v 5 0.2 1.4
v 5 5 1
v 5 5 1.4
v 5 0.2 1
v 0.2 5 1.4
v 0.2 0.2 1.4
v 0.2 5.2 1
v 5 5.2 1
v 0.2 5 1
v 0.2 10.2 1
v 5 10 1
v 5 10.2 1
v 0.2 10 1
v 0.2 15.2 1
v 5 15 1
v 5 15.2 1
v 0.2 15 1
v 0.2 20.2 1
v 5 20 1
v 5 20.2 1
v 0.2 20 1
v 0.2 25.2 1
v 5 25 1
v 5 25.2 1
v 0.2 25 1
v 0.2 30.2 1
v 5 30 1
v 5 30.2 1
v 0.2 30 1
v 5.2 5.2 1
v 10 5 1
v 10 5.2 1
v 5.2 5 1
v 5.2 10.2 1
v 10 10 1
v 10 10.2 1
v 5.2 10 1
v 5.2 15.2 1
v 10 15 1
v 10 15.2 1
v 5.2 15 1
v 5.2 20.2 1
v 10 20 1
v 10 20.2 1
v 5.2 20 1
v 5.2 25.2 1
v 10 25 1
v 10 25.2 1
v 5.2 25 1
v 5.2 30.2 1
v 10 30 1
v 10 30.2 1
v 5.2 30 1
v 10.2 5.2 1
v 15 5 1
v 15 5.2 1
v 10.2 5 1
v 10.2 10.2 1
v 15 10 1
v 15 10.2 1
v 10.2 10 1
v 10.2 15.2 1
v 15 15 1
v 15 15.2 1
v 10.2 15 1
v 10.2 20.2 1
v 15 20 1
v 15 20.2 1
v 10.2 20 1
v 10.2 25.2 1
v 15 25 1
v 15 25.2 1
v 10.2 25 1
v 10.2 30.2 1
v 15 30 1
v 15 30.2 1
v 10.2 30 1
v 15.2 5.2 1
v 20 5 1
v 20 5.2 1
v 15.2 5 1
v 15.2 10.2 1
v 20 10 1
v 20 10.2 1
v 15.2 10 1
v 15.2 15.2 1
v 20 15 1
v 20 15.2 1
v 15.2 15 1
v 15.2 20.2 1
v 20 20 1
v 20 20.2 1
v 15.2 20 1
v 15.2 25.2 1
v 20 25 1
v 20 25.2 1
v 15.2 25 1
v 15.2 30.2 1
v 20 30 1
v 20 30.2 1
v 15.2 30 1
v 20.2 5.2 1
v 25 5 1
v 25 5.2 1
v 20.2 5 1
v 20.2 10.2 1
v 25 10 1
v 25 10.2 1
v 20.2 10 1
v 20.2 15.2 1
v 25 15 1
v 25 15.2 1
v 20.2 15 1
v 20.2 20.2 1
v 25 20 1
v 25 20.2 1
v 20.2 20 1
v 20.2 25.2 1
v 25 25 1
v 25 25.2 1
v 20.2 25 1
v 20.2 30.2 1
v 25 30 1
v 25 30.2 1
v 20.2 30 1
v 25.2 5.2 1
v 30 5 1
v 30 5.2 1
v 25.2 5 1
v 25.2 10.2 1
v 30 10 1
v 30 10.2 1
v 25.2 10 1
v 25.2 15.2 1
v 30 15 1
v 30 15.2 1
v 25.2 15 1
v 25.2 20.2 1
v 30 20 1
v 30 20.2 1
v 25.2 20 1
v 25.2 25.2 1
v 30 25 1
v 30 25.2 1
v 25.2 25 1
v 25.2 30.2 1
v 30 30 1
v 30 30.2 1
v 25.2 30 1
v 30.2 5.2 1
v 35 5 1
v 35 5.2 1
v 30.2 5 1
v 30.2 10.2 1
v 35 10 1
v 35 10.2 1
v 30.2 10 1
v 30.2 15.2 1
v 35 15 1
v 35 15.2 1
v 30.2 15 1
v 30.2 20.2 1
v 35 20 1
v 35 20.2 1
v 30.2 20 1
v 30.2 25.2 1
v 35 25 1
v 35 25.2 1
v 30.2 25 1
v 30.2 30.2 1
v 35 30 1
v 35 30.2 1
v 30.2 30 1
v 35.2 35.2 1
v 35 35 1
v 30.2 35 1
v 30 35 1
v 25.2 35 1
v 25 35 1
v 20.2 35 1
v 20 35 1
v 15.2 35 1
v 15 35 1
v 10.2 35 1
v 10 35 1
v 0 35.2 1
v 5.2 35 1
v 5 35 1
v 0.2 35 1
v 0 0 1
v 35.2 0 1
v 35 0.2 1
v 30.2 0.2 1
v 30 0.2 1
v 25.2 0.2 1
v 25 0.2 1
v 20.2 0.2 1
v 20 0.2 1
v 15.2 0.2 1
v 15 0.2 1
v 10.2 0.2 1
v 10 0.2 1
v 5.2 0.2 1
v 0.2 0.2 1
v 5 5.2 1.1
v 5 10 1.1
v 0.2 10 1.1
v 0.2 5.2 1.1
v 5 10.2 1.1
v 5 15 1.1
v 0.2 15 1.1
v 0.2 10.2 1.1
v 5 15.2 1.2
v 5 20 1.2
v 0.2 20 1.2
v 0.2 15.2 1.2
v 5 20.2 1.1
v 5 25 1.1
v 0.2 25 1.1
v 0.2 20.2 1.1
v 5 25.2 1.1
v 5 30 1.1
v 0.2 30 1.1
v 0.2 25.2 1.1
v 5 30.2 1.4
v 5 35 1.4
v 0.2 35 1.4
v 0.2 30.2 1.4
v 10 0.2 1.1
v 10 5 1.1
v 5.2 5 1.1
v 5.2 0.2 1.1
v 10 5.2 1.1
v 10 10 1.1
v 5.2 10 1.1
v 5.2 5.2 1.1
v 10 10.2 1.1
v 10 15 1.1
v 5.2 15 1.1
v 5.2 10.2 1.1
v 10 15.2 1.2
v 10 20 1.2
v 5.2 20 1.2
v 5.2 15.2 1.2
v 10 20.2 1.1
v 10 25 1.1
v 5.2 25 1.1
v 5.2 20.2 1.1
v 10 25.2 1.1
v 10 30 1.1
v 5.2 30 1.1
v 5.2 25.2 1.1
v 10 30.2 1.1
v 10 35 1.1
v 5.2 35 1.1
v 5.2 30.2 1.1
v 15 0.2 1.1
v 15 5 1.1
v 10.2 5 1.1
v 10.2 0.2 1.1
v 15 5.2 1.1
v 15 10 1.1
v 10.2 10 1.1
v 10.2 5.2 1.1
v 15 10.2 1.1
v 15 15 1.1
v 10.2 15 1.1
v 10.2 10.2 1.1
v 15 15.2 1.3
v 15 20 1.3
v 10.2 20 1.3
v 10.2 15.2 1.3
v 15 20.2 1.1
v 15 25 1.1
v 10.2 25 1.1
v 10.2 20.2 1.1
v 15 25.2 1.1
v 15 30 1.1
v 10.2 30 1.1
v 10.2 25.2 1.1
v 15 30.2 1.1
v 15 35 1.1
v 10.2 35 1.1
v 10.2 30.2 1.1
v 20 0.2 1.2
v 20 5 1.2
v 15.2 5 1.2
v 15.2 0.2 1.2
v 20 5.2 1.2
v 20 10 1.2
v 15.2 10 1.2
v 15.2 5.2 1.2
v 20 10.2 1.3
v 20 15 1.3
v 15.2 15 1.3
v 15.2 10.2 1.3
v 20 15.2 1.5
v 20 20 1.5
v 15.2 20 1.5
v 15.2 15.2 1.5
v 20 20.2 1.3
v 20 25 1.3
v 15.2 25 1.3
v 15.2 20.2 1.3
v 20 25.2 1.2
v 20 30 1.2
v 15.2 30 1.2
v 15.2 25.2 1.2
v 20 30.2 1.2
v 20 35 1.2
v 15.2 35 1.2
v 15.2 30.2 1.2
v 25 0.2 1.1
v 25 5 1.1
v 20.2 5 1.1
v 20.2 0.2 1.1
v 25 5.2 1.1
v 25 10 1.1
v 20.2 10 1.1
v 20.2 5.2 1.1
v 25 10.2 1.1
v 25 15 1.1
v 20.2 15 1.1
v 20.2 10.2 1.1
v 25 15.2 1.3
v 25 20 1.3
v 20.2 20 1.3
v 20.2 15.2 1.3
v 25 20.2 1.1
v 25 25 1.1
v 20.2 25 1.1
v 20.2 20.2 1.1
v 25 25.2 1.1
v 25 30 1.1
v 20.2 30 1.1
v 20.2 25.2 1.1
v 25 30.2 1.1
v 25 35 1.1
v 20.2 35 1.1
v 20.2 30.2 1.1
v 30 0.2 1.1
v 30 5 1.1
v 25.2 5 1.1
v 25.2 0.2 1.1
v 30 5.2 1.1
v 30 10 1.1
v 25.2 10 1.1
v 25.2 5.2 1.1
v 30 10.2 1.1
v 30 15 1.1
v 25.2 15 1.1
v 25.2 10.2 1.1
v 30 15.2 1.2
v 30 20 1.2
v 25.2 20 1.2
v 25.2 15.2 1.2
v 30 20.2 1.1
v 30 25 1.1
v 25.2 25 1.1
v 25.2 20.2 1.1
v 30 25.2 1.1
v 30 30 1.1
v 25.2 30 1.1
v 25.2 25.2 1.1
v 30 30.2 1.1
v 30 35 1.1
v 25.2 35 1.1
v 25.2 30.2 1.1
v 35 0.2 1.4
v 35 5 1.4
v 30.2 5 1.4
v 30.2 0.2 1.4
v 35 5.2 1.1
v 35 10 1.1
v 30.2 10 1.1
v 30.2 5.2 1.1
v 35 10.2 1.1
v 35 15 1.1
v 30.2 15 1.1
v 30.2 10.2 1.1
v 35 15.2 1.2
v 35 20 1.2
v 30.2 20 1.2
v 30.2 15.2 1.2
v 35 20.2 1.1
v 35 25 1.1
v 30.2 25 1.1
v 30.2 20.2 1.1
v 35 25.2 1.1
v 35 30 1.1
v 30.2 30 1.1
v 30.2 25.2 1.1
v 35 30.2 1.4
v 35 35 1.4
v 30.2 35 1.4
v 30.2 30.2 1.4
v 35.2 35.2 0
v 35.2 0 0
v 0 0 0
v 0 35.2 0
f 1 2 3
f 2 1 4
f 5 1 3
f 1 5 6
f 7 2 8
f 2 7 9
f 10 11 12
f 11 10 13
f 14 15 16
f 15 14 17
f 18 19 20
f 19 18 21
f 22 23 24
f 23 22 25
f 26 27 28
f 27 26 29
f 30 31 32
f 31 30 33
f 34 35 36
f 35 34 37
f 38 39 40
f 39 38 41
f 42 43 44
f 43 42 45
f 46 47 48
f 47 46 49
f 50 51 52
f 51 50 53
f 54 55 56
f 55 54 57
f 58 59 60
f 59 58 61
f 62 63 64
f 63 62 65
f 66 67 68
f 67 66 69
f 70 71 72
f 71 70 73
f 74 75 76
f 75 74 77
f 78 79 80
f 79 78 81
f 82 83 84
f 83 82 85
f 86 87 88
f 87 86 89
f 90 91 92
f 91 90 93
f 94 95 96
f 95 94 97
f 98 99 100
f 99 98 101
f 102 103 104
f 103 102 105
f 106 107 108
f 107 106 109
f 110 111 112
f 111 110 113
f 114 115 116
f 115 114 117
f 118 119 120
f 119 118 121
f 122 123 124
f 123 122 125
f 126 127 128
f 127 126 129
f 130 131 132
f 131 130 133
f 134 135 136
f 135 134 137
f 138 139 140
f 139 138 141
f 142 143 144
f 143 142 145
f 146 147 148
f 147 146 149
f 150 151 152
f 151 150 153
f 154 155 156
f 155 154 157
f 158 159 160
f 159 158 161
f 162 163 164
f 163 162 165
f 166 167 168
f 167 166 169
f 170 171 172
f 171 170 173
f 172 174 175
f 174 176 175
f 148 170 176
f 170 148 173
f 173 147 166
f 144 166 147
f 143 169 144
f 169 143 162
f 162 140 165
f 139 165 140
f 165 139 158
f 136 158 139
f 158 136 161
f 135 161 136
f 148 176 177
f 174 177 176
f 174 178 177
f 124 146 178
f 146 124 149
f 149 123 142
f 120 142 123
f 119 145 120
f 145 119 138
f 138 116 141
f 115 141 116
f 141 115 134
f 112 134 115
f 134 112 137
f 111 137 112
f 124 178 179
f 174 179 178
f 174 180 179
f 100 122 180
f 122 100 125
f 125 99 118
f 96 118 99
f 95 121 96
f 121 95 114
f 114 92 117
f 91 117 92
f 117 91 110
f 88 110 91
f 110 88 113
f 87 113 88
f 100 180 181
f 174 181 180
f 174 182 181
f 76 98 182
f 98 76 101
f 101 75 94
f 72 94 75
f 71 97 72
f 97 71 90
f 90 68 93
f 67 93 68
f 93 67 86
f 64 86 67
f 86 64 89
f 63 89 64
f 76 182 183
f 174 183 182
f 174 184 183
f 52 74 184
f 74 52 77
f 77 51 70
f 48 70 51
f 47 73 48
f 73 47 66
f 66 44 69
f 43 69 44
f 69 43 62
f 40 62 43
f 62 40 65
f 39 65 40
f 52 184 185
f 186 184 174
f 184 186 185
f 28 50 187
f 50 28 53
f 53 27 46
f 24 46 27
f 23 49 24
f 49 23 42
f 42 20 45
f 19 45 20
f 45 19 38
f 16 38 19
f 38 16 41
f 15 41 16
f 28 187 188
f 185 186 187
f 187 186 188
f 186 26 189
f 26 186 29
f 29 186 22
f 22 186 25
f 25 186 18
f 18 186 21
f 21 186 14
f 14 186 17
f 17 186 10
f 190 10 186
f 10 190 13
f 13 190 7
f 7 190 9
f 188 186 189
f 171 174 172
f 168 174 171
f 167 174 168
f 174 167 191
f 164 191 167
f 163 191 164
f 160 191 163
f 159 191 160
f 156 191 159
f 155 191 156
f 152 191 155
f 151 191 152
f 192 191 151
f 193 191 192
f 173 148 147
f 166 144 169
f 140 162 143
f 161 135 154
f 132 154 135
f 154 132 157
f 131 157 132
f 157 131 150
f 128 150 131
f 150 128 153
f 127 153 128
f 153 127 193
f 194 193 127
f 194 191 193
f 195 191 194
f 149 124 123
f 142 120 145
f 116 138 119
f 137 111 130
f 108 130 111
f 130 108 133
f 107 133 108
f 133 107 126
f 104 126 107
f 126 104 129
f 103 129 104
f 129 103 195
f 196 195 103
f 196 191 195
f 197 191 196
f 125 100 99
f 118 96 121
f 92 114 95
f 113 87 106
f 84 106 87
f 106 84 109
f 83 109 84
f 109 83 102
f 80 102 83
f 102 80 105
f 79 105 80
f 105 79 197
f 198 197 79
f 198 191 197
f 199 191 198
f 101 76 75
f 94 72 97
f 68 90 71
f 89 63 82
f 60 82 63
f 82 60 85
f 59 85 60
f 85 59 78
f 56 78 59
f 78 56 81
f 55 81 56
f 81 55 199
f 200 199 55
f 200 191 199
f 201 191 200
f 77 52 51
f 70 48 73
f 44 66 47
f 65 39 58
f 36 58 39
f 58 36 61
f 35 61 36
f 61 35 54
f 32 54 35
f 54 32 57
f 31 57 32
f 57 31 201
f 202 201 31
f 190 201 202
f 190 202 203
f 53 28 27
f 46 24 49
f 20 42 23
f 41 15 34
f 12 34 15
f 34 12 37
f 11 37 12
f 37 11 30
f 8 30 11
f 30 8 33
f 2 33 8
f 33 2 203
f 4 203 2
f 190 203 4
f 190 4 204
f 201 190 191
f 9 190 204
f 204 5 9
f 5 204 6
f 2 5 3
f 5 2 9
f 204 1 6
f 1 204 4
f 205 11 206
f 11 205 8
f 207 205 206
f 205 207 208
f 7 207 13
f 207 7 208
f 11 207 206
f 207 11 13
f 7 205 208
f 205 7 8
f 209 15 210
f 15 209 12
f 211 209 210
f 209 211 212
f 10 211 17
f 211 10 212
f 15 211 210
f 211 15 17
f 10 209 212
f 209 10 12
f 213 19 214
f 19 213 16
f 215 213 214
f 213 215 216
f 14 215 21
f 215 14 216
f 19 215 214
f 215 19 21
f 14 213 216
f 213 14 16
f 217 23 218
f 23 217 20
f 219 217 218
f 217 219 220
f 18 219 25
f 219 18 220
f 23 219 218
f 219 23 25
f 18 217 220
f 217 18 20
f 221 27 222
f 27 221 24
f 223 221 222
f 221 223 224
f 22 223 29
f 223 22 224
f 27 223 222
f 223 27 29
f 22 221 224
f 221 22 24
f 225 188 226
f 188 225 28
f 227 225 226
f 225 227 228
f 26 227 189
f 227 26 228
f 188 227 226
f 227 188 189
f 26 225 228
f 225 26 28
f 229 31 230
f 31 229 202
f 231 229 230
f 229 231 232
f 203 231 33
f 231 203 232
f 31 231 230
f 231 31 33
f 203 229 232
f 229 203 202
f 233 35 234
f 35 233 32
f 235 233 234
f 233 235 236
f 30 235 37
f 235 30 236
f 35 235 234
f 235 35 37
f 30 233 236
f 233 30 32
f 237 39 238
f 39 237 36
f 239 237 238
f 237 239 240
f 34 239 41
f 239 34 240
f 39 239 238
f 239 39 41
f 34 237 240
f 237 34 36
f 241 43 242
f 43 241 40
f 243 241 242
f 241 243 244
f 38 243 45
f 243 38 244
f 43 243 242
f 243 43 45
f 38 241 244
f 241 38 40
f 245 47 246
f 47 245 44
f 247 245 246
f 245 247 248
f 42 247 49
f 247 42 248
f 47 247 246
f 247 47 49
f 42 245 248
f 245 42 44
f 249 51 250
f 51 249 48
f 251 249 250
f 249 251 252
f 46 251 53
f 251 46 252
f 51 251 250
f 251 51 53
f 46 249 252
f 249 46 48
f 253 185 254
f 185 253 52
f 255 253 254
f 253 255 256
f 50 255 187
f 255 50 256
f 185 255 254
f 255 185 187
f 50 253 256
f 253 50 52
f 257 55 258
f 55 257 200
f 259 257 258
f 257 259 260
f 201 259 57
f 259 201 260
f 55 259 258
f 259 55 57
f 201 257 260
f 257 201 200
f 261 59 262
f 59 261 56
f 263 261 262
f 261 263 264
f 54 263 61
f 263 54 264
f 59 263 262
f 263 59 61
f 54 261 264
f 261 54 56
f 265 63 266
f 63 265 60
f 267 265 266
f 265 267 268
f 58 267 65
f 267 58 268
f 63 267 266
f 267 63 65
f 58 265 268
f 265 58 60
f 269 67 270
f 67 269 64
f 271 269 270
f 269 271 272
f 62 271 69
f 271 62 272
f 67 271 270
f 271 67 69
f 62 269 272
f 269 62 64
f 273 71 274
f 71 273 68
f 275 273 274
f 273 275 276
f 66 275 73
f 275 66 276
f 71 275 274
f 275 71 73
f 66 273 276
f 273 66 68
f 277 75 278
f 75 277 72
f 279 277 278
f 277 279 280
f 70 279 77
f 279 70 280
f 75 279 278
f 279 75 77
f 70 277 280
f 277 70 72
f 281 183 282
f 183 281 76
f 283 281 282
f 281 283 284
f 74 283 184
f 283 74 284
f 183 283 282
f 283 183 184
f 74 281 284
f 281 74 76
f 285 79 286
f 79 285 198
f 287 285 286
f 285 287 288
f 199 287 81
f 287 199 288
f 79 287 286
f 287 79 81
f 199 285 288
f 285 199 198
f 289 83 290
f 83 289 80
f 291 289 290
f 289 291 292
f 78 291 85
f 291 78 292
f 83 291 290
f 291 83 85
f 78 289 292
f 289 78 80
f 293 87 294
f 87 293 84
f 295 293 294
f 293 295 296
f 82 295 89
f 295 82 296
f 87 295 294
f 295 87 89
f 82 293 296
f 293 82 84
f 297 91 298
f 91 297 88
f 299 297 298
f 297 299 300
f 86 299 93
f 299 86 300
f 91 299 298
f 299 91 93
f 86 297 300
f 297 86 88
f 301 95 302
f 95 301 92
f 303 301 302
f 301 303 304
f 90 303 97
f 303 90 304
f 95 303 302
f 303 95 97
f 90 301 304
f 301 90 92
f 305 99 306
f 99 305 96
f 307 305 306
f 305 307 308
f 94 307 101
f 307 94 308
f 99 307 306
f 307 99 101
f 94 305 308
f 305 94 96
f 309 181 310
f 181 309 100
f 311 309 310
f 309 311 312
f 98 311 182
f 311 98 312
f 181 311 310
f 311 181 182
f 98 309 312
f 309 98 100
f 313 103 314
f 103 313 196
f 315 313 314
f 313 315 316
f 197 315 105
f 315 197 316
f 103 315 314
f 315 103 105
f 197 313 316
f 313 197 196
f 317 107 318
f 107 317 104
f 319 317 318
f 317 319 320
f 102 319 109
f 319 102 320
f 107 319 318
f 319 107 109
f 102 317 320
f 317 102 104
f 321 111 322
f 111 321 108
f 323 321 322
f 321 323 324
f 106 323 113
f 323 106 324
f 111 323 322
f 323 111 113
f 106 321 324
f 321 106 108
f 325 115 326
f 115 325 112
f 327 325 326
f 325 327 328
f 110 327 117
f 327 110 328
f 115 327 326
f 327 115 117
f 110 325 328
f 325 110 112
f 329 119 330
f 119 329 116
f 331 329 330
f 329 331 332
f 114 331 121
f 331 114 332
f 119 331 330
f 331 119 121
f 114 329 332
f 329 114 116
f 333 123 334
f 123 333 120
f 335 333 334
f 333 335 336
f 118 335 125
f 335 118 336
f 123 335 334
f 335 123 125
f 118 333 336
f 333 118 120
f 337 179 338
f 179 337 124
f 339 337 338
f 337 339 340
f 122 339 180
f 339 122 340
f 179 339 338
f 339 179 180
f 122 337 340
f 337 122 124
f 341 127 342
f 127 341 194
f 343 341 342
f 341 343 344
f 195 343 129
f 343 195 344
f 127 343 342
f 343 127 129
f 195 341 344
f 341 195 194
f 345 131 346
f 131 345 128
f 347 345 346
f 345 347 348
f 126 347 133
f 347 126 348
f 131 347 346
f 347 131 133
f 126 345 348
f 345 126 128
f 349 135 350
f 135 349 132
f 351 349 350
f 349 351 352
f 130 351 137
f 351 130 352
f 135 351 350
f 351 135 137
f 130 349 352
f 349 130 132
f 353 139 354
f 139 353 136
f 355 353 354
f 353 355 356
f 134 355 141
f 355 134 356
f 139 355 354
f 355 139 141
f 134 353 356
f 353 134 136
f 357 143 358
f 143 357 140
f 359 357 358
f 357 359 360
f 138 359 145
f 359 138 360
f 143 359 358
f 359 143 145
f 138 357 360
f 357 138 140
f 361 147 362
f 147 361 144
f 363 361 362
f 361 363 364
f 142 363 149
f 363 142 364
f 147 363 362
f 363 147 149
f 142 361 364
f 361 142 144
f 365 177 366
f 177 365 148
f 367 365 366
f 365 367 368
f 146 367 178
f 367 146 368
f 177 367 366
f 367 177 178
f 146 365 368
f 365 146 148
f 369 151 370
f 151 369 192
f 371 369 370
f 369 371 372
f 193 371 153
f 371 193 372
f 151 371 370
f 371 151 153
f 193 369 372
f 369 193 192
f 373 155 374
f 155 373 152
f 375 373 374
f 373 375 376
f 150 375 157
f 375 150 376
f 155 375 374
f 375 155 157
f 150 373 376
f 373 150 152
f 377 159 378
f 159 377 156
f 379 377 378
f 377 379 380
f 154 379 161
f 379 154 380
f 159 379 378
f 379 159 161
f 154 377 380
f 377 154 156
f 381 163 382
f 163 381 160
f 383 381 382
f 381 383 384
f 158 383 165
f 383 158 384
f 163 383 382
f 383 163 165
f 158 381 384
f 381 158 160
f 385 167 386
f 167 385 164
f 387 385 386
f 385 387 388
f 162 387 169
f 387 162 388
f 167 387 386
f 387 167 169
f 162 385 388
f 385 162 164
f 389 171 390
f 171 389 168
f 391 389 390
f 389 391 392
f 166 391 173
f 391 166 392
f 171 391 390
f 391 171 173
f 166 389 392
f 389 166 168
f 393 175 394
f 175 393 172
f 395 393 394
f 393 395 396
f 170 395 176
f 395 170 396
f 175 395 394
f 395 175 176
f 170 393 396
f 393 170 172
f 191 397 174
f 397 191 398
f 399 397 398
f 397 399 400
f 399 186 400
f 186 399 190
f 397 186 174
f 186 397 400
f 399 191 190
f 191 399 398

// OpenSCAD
// ------------------------------------------------- ;
//
//         Single File Tafl Game Generator
//
// ------------------------------------------------- ;

// ------------------------------------------------- ;
//         User Configuration Section
// ------------------------------------------------- ;

// Specific set configuration to print. 1 - Brandubh, 2 - Ard Ri, 3 - Tablut, 4 - Tawlbwrdd, 5 - Hnefatafl, 6 - Alea Evangelii.
SetID = 1;

// What to generate. 1 - Board, 2 - Pieces, 3 - Single Pawn, 4 - Single King.
Generate = 1;

// Specific piece style to print. 1 - Horik, 2 - Forkbeard
PieceID = 1;

// Level of detail for smoothing. Low - 90, Medium - 180, High - 360.
Detail = 180;

// Scale output. Pieces have a 4mm base with varying overhangs and the boards are 4.8mm squares with 0.2mm spacing and margins.
Scale = 1;

// ------------------------------------------------- ;
//         End User Configuration
// ------------------------------------------------- ;

scale(Scale)

if (Generate == 1) {
   
   GenerateBoard(SetID);
   
} else if (Generate == 2) {
   
   GeneratePieces(SetID, PieceID, Detail);
   
} else if (Generate == 3) {
   
   TaflPawn(PieceID, Detail);
   
} else if (Generate == 4) {
   
   TaflKing(PieceID, Detail);
   
}

// Board definition
// 0 - Normal Square
// 1 - Black Square
// 2 - White Square
// 3 - Corner
// 4 - Throne

// Generate tafl board by SetID
module GenerateBoard(SetID) {

   if (SetID == 1) {
      
      // Brandubh
      BoardSize = 7;
      
      Board = [[3, 0, 0, 1, 0, 0, 3],
               [0, 0, 0, 1, 0, 0, 0],
               [0, 0, 0, 2, 0, 0, 0],
               [1, 1, 2, 4, 2, 1, 1],
               [0, 0, 0, 2, 0, 0, 0],
               [0, 0, 0, 1, 0, 0, 0],
               [3, 0, 0, 1, 0, 0, 3]];
      
      TaflBoard(BoardSize, Board);
      
   } else if ((SetID == 2)) {
      
      // Ard Ri
      BoardSize = 7;
      
      Board = [[3, 0, 1, 1, 1, 0, 3],
               [0, 0, 0, 1, 0, 0, 0],
               [1, 0, 2, 2, 2, 0, 1],
               [1, 1, 2, 4, 2, 1, 1],
               [1, 0, 2, 2, 2, 0, 1],
               [0, 0, 0, 1, 0, 0, 0],
               [3, 0, 1, 1, 1, 0, 3]];
      
      TaflBoard(BoardSize, Board);
      
   } else if ((SetID == 3)) {
      
      // Tablut
      BoardSize = 9;
      
      Board = [[3, 0, 0, 1, 1, 1, 0, 0, 3],
               [0, 0, 0, 0, 1, 0, 0, 0, 0],
               [0, 0, 0, 0, 2, 0, 0, 0, 0],
               [1, 0, 0, 0, 2, 0, 0, 0, 1],
               [1, 1, 2, 2, 4, 2, 2, 1, 1],
               [1, 0, 0, 0, 2, 0, 0, 0, 1],
               [0, 0, 0, 0, 2, 0, 0, 0, 0],
               [0, 0, 0, 0, 1, 0, 0, 0, 0],
               [3, 0, 0, 1, 1, 1, 0, 0, 3],];
      
      
      TaflBoard(BoardSize, Board);
      
   } else if (SetID == 4) { 
      
      //Tawlbwrdd
      BoardSize = 11;
      
      Board = [[3, 0, 0, 0, 1, 1, 1, 0, 0, 0, 3],
               [0, 0, 0, 0, 1, 0, 1, 0, 0, 0, 0],
               [0, 0, 0, 0, 0, 1, 0, 0, 0, 0, 0],
               [0, 0, 0, 0, 0, 2, 0, 0, 0, 0, 0],
               [1, 1, 0, 0, 2, 2, 2, 0, 0, 1, 1],
               [1, 0, 1, 2, 2, 4, 2, 2, 1, 0, 1],
               [1, 1, 0, 0, 2, 2, 2, 0, 0, 1, 1],
               [0, 0, 0, 0, 0, 2, 0, 0, 0, 0, 0],
               [0, 0, 0, 0, 0, 1, 0, 0, 0, 0, 0],
               [0, 0, 0, 0, 1, 0, 1, 0, 0, 0, 0],
               [3, 0, 0, 0, 1, 1, 1, 0, 0, 0, 3]];
      
      
      TaflBoard(BoardSize, Board);
      
   } else if ((SetID == 5)) {
      
      // Hnefatafl
      BoardSize = 11;
      
      Board = [[3, 0, 0, 1, 1, 1, 1, 1, 0, 0, 3],
               [0, 0, 0, 0, 0, 1, 0, 0, 0, 0, 0],
               [0, 0, 0, 0, 0, 0, 0, 0, 0, 0, 0],
               [1, 0, 0, 0, 0, 2, 0, 0, 0, 0, 1],
               [1, 0, 0, 0, 2, 2, 2, 0, 0, 0, 1],
               [1, 1, 0, 2, 2, 4, 2, 2, 0, 1, 1],
               [1, 0, 0, 0, 2, 2, 2, 0, 0, 0, 1],
               [1, 0, 0, 0, 0, 2, 0, 0, 0, 0, 1],
               [0, 0, 0, 0, 0, 0, 0, 0, 0, 0, 0],
               [0, 0, 0, 0, 0, 1, 0, 0, 0, 0, 0],
               [3, 0, 0, 1, 1, 1, 1, 1, 0, 0, 3]];
      
      
      TaflBoard(BoardSize, Board);
      
   } else if (SetID == 6) {
      
      // Alea Evangelii
      BoardSize =19;
      
      Board = [[3, 3, 1, 0, 0, 1, 0, 0, 0, 0, 0, 0, 0, 1, 0, 0, 1, 3, 3],
               [3, 3, 0, 0, 0, 0, 0, 0, 0, 0, 0, 0, 0, 0, 0, 0, 0, 3, 3],
               [1, 0, 0, 0, 0, 1, 0, 0, 0, 0, 0, 0, 0, 1, 0, 0, 0, 0, 1],
               [0, 0, 0, 0, 0, 0, 0, 1, 0, 1, 0, 1, 0, 0, 0, 0, 0, 0, 0],
               [0, 0, 0, 0, 0, 0, 1, 0, 2, 0, 2, 0, 1, 0, 0, 0, 0, 0, 0],
               [1, 0, 1, 0, 0, 1, 0, 0, 0, 0, 0, 0, 0, 1, 0, 0, 1, 0, 1],
               [0, 0, 0, 0, 1, 0, 0, 0, 0, 2, 0, 0, 0, 0, 1, 0, 0, 0, 0],
               [0, 0, 0, 1, 0, 0, 0, 0, 2, 0, 2, 0, 0, 0, 0, 1, 0, 0, 0],
               [0, 0, 0, 0, 2, 0, 0, 2, 0, 2, 0, 2, 0, 0, 2, 0, 0, 0, 0],
               [0, 0, 0, 1, 0, 0, 2, 0, 2, 4, 2, 0, 2, 0, 0, 1, 0, 0, 0],
               [0, 0, 0, 0, 2, 0, 0, 2, 0, 2, 0, 2, 0, 0, 2, 0, 0, 0, 0],
               [0, 0, 0, 1, 0, 0, 0, 0, 2, 0, 2, 0, 0, 0, 0, 1, 0, 0, 0],
               [0, 0, 0, 0, 1, 0, 0, 0, 0, 2, 0, 0, 0, 0, 1, 0, 0, 0, 0],
               [1, 0, 1, 0, 0, 1, 0, 0, 0, 0, 0, 0, 0, 1, 0, 0, 1, 0, 1],
               [0, 0, 0, 0, 0, 0, 1, 0, 2, 0, 2, 0, 1, 0, 0, 0, 0, 0, 0],
               [0, 0, 0, 0, 0, 0, 0, 1, 0, 1, 0, 1, 0, 0, 0, 0, 0, 0, 0],
               [1, 0, 0, 0, 0, 1, 0, 0, 0, 0, 0, 0, 0, 1, 0, 0, 0, 0, 1],
               [3, 3, 0, 0, 0, 0, 0, 0, 0, 0, 0, 0, 0, 0, 0, 0, 0, 3, 3],
               [3, 3, 1, 0, 0, 1, 0, 0, 0, 0, 0, 0, 0, 1, 0, 0, 1, 3, 3]];
      
      
      TaflBoard(BoardSize, Board);
      
   }
   
};

// Create tafl board.
module TaflBoard(BoardSize, Board) {
   
   union() {
      
      cube([(BoardSize * 5) + 0.2, (BoardSize * 5) + 0.2, 1]);
      
      for (x = [0:BoardSize - 1]) {
         
         for (y = [0:BoardSize - 1]) {
            
            translate([(x * 5) + 0.2, (y * 5) + 0.2, 1]) {
              
              cube([4.8 ,4.8 ,(Board[x][y] + 1) * 0.1]);
              
            }
            
         }
         
      }
   
   }
   
};

// Generate set of pieces by SetID.
module GeneratePieces(SetID, PieceID, Detail) {
   
   if (SetID == 1) {
      
      // Brandubh
      TaflPieces(
      KingCount = 1,
      WhiteCount = 4,
      BlackCount = 8,
      GridPadding = 0,
      PieceID = PieceID,
      Detail = Detail);
      
   } else if ((SetID == 2) || (SetID == 3)) {
      
      // Ard Ri/Tablut
      TaflPieces(
      KingCount = 1,
      WhiteCount = 8,
      BlackCount = 12,
      GridPadding = 0,
      PieceID = PieceID,
      Detail = Detail);
      
   } else if ((SetID == 4) || (SetID == 5)) {
      
      // Hnefatafl/Tawlbwrdd
      TaflPieces(
      KingCount = 1,
      WhiteCount = 12,
      BlackCount = 24,
      GridPadding = 1,
      PieceID = PieceID,
      Detail = Detail);
      
   } else if (SetID == 6) {
      
      // Alea Evangelii
      TaflPieces(
      KingCount = 1,
      WhiteCount = 24,
      BlackCount = 48,
      GridPadding = 0,
      PieceID = PieceID,
      Detail = Detail);
      
   }
   
};

// Generate selected piece layout for printing.
module TaflPieces(KingCount, WhiteCount, BlackCount, GridPadding, PieceID, Detail) {
   
   TotalCount = BlackCount + WhiteCount + KingCount;
   
   GridLayout = round(sqrt(TotalCount)) + GridPadding;
   
   for (x = [1:GridLayout]){
      
      for (y = [1:GridLayout]){
         
         CurrentPiece = (((x-1) * GridLayout) + y);
         
         if (CurrentPiece < KingCount + 1) {
            
            color("white")
            translate([(x * 5) - 2.5, (y * 5) - 2.5])
            TaflKing(PieceID, Detail);
            
         } else if ((CurrentPiece > KingCount)&&(CurrentPiece < WhiteCount + KingCount + 1)) {
            
            color("white")
            translate([(x * 5) - 2.5, (y * 5) - 2.5])
            TaflPawn(PieceID, Detail);
            
         } else if ((CurrentPiece < TotalCount + 1)&&(CurrentPiece > WhiteCount + KingCount)) {
            
            color("black")
            translate([(x * 5) - 2.5, (y * 5) - 2.5])
            TaflPawn(PieceID, Detail);
            
         }
         
      }
      
   }
   
};

// Generate pawn of pieces by PieceID.
module TaflPawn(PieceID, Detail) {
   
   if (PieceID == 1) {
      
      HorikTaflPawn(Detail);
      
   } else if (PieceID == 2) {
      
      ForkbeardTaflPawn(Detail);
      
   }
   
};

// Generate Horik style pawn piece.
module HorikTaflPawn(Detail) {
   
   // Join pieces into single manifold mesh.
   union() {
      
      // Rotate extrude base and stem from polygon.
      rotate_extrude($fn=Detail) {
         polygon( points=[ [0, 0], [2, 0], [2.1, 0.2], [1.75, 0.3], [1.5, 0.5], [1.25, 0.8], [1.5, 1], [1.5, 1.1], [1.4, 1.15], [1.2, 1.3], [1, 1.4], [1, 2], [1, 3.4], [1.1, 3.5], [1.1, 3.6], [1, 3.7], [0.5, 5], [0, 5] ] );
      }
      
      // Create head piece and translate.
      translate([0, 0, 5]) {
         sphere(1.25, center=true, $fn=Detail);
      }
      
   };
   
};

// Generate Forkbeard style pawn piece.
module ForkbeardTaflPawn(Detail) {
   
   // Indent base with low poly sphere.
   difference() {
      
      // Rotate extrude base from polygon.
      rotate_extrude($fn=Detail) {
         polygon( points=[ [0, 0], [2, 0], [2.1, 0.2], [2.1, 1], [1.8, 1], [1.8, 0.8], [0, 0.8] ] );
      }
      
      // Indent piece with sphere.
      translate([0, 0, 1.5]) {
         sphere(1, center=true, $fn=6);
      }
      
   };
   
};

// Generate king by PieceID.
module TaflKing(PieceID, Detail) {
   
   if (PieceID == 1) {
      
      HorikTaflKing(Detail);
      
   } else if (PieceID == 2) {
      
      ForkbeardTaflKing(Detail);
      
   }  
   
};

// Generate Horik style king piece.
module HorikTaflKing(Detail = 180) {

   // Join pieces into single manifold mesh.
   union() {
      
      // Rotate extrude base and stem from polygon.
      rotate_extrude($fn=Detail) {
         polygon( points=[ [0, 0], [2, 0], [2.1, 0.2], [1.75, 0.3], [1.5, 0.5], [1.25, 0.8], [1.5, 1], [1.5, 1.1], [1.4, 1.15], [1.2, 1.3], [1, 1.4], [1, 2], [1, 5.4], [1.1, 5.5], [1.1, 5.6], [1, 5.7], [0.5, 7], [0, 7] ] );
      }
      
      // Create head piece and translate.
      translate([0, 0, 7]) {
         sphere(1.25, center=true, $fn=Detail);
      }
      
   };
   
};

// Generate Forkbeard style king piece.
module ForkbeardTaflKing(Detail) {
   
   // Indent base with low poly sphere.
   difference() {
      
      // Rotate extrude base from polygon.
      rotate_extrude($fn=Detail) {
         polygon( points=[ [0, 0], [2, 0], [2.1, 0.2], [2.1, 1.5], [1.8, 1.5], [1.8, 1.3], [0, 1.3] ] );
      }
      
      // Indent piece with sphere.
      translate([0, 0, 1.5]) {
         sphere(1, center=true, $fn=8);
      }
      
   };
   
};
